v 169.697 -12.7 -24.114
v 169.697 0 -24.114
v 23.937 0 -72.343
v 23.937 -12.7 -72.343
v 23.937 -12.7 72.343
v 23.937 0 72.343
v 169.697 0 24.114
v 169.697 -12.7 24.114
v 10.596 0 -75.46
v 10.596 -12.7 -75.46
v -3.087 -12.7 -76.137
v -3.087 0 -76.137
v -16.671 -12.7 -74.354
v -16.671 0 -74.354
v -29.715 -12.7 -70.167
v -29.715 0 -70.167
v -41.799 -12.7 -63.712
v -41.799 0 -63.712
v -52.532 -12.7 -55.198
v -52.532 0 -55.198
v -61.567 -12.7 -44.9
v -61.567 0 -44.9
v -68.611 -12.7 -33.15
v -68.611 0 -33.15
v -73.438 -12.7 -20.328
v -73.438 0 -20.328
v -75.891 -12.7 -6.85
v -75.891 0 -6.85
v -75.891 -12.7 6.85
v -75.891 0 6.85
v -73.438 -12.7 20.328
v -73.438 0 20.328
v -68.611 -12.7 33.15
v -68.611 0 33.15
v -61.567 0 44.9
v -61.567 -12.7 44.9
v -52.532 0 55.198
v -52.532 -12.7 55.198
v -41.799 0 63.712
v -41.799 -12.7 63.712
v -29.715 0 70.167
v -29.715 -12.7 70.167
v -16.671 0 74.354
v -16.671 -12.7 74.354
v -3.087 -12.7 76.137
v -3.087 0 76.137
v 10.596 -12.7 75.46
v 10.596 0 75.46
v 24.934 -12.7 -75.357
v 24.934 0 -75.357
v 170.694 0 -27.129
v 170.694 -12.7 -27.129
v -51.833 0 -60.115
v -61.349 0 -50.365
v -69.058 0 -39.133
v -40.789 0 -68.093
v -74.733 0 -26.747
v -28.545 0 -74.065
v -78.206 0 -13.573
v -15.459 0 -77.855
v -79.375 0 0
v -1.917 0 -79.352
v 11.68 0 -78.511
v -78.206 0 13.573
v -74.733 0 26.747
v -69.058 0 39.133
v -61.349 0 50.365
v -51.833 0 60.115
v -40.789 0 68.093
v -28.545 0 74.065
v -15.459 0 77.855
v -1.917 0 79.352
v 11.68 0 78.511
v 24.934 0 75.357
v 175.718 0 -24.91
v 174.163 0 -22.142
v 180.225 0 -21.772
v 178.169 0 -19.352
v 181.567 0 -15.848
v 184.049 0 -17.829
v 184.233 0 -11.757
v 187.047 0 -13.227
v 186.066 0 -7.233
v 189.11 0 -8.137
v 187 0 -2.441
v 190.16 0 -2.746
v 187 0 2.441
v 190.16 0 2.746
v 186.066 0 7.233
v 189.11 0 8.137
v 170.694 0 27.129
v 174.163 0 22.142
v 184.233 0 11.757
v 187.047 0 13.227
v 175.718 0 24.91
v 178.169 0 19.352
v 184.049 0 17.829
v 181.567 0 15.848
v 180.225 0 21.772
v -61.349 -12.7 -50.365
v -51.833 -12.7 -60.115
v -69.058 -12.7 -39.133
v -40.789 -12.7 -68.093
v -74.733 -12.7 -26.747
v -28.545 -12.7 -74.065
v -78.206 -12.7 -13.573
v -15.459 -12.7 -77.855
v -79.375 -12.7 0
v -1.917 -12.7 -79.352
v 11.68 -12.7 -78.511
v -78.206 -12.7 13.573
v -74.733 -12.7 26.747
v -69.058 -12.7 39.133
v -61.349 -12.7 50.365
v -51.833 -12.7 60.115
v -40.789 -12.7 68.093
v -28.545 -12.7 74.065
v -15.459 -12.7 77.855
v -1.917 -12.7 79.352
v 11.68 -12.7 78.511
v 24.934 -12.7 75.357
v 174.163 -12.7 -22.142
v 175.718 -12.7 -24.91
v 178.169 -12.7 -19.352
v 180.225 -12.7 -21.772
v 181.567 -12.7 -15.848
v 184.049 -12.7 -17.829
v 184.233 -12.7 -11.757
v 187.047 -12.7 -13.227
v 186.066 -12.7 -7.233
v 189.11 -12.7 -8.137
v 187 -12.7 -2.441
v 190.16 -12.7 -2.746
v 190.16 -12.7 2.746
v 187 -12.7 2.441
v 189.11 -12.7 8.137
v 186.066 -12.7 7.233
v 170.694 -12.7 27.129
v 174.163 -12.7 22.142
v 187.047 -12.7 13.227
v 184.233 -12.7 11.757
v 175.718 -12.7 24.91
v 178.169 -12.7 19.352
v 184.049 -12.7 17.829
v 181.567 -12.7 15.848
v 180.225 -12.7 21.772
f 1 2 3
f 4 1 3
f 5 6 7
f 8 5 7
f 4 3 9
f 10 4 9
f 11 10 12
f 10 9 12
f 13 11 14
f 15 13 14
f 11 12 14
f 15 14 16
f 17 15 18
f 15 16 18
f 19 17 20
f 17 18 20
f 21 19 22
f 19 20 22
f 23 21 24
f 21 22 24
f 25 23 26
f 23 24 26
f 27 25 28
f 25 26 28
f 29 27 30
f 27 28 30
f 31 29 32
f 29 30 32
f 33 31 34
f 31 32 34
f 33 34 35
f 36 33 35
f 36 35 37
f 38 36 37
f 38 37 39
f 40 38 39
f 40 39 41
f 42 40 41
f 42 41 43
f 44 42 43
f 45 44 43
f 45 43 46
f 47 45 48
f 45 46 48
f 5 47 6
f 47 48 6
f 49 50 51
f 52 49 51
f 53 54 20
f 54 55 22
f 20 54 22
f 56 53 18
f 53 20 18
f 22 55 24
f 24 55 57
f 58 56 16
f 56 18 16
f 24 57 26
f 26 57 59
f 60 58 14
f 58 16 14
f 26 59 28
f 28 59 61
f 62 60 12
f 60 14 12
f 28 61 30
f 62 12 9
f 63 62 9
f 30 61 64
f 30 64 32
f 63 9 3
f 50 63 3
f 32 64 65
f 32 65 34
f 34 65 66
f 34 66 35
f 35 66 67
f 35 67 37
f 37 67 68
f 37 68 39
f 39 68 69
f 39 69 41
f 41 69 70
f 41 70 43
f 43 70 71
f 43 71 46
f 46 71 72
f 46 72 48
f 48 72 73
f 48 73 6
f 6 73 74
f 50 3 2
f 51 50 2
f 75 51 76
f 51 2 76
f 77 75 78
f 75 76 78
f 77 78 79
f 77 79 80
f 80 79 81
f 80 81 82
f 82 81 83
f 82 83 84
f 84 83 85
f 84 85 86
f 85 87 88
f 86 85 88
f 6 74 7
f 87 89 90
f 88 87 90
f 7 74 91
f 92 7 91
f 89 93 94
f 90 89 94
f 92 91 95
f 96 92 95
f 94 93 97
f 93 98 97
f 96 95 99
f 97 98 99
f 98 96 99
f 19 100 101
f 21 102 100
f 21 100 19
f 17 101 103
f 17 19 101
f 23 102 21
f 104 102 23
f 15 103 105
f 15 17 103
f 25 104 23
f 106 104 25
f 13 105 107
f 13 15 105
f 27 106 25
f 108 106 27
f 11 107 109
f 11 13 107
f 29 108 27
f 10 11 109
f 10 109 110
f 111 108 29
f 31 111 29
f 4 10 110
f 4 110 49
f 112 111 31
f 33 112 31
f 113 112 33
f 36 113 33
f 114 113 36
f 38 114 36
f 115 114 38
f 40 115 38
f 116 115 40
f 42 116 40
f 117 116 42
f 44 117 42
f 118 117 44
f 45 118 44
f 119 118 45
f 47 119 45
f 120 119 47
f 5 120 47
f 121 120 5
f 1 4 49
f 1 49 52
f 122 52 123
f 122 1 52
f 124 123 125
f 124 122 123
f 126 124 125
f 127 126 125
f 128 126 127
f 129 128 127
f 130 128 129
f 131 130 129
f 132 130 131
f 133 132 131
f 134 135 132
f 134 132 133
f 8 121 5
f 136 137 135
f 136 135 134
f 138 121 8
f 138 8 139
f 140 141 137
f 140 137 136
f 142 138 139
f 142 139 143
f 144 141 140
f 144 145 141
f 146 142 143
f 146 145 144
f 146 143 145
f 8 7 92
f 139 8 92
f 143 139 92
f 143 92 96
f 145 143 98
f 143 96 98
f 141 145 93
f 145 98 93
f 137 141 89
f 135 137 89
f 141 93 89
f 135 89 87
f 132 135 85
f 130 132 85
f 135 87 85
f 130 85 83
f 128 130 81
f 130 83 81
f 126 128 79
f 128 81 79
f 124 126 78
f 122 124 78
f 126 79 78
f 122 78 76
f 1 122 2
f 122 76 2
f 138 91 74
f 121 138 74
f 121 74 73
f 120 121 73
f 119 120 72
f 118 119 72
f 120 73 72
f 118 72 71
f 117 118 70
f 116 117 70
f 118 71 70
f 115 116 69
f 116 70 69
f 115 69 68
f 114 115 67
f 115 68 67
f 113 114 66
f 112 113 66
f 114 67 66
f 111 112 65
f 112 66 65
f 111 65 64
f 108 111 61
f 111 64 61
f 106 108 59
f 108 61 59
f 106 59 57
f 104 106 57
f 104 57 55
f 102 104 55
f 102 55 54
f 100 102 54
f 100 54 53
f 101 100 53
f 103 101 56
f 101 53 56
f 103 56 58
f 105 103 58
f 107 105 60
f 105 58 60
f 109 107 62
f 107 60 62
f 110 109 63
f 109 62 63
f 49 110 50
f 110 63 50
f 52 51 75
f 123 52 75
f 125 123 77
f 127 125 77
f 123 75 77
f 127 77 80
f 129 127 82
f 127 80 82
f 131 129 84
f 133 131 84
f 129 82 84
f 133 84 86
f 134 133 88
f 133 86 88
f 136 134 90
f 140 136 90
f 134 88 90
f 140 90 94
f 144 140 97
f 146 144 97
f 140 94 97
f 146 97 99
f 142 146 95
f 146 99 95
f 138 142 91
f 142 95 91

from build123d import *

# Parameters (mm, degrees)
F2_DEPTH = 12.7


with BuildPart() as f2:
    # F1 (on face) → F2 (new body)
    with BuildSketch(Plane.XZ):
        with BuildLine():
            Line((170.693952, 27.128556), (24.933873, 75.357101))
            ThreePointArc((24.933873, 75.357101), (-79.375, 0), (24.933873, -75.357101))
            Line((24.933873, -75.357101), (170.693952, -27.128556))
            ThreePointArc((170.693952, -27.128556), (190.292758, 0), (170.693952, 27.128556))
        make_face()
        with BuildLine():
            ThreePointArc((23.936518, -72.342817), (-76.2, 0), (23.936518, 72.342817))
            Line((23.936518, 72.342817), (169.696597, 24.114272))
            ThreePointArc((169.696597, 24.114272), (187.117758, 0), (169.696597, -24.114272))
            Line((169.696597, -24.114272), (23.936518, -72.342817))
        make_face(mode=Mode.SUBTRACT)
    extrude(amount=F2_DEPTH)


solid = f2.part
